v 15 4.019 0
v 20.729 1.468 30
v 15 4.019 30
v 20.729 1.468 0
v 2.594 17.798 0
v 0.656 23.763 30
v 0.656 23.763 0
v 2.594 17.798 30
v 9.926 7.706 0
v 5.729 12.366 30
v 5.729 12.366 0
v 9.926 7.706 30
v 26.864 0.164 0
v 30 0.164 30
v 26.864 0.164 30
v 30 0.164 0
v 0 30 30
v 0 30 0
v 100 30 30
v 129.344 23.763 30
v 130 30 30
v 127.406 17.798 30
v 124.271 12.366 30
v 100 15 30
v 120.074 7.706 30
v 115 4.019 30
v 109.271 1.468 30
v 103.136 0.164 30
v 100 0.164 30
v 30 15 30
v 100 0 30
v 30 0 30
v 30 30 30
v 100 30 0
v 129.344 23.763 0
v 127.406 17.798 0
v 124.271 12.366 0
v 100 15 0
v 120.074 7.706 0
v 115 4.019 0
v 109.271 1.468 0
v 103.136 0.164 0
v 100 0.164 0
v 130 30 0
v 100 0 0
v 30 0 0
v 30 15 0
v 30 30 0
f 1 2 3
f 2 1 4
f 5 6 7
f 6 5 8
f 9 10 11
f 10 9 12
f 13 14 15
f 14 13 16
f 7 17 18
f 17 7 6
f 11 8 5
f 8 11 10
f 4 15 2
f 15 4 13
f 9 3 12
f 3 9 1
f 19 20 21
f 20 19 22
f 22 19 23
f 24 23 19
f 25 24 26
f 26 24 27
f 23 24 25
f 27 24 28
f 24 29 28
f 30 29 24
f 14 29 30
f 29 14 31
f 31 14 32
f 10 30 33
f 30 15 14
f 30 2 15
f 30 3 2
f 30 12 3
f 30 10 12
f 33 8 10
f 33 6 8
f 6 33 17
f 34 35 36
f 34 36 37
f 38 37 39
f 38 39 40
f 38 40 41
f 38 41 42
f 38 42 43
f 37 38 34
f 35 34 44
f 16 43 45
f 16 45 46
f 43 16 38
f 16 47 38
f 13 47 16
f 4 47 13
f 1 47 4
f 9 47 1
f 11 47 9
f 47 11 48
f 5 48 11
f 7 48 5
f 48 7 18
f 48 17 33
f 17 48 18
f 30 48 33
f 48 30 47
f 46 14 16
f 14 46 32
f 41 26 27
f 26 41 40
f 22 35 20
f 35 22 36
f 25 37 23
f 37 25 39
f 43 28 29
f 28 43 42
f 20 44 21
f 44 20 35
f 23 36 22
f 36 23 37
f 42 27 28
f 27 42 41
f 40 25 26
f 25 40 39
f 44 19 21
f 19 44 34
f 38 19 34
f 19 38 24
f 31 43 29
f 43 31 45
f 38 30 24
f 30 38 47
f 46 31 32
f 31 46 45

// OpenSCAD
/*
        ENAMEL PROJECT - MELANIE BALJKO
        MODELLING FOR VERSION 3
        CREATED BY: SHWETA DIXIT - 2017
        
        TITLE --- VERSION 3 - VARIANT 1 - LID FOR THE ROUNDED BOX
        
        *******ATTEMPT TWO***********
        
        (Measurements in mm)
        
        
*/

////////////////// VARIABLES ////////////////////////////

// For outer rounded cube
x_out = 160;
y_out = 120;
z_out = 80;
r_out = 30;

// For inner cube
x_in = x_out - 30;
y_in = y_out - 30;
z_in = z_out + 5;

// Leaving space at the top for the slider
z_space = 10;

// For the outer rounded edge
r_edge = r_out;
z_edge = (z_out/2) - z_space;

// For cube to cut the cylinders
x_cut = 2*r_edge;
y_cut = r_edge;
z_cut = z_edge;

// For modelling the base
x_base = x_out - (3*r_edge);
y_base = r_edge/2;
z_base = z_edge;

// For top slider layer
x_slid = x_in + 6;
y_slid = y_in + (y_out - y_in)/2 + 3;
z_slid = 6; // height of top slider layer

    
////////////////// MODULES //////////////////////////////

// Modelling cube to cut the cylinders
module cut_cyl(x_cut, y_cut, z_cut)
{
    translate([0, r_edge, 0])
    {
        cube([x_cut, y_cut, z_cut]);
    }
}

// Modelling rotated cube to cut cylinders
module rot_cut_cyl(x_cut, y_cut, z_cut)
{
    rotate([0, 0, 90])
        {
            translate([0, - 2*r_edge, 0])
            {
                cube([x_cut, y_cut, z_cut]);
            }
        }
}


// Modelling outer rounded edges
module out_edge_cyl1(z_edge, r_edge)
{
    difference()
    {
        translate([r_edge, r_edge, 0])
        {
            cylinder(r = r_edge, h = z_edge);
        }
        
        cut_cyl(x_cut, y_cut, z_cut);
        rot_cut_cyl(x_cut, y_cut, z_cut);
        
    }
}

module out_edge_cyl2(z_edge, r_edge)
{
    rotate([0, - 180, 0])
    {
        translate([-(x_out - r_edge), 0, -(r_edge)])
        {
            out_edge_cyl1(z_edge, r_edge);
        }
    }
}

// Modelling the lower base
module lower_base(x_base, y_base, z_base)
{
    translate([r_edge, 0, 0])
    {
        cube([x_base, y_base, z_base]);
    }
}

// Modelling the slider part



    

/////////////// BUILDING MODEL //////////////////

// Building the lid
out_edge_cyl1(z_edge, r_edge);
out_edge_cyl2(z_edge, r_edge);
lower_base(x_base, y_base, z_base);
